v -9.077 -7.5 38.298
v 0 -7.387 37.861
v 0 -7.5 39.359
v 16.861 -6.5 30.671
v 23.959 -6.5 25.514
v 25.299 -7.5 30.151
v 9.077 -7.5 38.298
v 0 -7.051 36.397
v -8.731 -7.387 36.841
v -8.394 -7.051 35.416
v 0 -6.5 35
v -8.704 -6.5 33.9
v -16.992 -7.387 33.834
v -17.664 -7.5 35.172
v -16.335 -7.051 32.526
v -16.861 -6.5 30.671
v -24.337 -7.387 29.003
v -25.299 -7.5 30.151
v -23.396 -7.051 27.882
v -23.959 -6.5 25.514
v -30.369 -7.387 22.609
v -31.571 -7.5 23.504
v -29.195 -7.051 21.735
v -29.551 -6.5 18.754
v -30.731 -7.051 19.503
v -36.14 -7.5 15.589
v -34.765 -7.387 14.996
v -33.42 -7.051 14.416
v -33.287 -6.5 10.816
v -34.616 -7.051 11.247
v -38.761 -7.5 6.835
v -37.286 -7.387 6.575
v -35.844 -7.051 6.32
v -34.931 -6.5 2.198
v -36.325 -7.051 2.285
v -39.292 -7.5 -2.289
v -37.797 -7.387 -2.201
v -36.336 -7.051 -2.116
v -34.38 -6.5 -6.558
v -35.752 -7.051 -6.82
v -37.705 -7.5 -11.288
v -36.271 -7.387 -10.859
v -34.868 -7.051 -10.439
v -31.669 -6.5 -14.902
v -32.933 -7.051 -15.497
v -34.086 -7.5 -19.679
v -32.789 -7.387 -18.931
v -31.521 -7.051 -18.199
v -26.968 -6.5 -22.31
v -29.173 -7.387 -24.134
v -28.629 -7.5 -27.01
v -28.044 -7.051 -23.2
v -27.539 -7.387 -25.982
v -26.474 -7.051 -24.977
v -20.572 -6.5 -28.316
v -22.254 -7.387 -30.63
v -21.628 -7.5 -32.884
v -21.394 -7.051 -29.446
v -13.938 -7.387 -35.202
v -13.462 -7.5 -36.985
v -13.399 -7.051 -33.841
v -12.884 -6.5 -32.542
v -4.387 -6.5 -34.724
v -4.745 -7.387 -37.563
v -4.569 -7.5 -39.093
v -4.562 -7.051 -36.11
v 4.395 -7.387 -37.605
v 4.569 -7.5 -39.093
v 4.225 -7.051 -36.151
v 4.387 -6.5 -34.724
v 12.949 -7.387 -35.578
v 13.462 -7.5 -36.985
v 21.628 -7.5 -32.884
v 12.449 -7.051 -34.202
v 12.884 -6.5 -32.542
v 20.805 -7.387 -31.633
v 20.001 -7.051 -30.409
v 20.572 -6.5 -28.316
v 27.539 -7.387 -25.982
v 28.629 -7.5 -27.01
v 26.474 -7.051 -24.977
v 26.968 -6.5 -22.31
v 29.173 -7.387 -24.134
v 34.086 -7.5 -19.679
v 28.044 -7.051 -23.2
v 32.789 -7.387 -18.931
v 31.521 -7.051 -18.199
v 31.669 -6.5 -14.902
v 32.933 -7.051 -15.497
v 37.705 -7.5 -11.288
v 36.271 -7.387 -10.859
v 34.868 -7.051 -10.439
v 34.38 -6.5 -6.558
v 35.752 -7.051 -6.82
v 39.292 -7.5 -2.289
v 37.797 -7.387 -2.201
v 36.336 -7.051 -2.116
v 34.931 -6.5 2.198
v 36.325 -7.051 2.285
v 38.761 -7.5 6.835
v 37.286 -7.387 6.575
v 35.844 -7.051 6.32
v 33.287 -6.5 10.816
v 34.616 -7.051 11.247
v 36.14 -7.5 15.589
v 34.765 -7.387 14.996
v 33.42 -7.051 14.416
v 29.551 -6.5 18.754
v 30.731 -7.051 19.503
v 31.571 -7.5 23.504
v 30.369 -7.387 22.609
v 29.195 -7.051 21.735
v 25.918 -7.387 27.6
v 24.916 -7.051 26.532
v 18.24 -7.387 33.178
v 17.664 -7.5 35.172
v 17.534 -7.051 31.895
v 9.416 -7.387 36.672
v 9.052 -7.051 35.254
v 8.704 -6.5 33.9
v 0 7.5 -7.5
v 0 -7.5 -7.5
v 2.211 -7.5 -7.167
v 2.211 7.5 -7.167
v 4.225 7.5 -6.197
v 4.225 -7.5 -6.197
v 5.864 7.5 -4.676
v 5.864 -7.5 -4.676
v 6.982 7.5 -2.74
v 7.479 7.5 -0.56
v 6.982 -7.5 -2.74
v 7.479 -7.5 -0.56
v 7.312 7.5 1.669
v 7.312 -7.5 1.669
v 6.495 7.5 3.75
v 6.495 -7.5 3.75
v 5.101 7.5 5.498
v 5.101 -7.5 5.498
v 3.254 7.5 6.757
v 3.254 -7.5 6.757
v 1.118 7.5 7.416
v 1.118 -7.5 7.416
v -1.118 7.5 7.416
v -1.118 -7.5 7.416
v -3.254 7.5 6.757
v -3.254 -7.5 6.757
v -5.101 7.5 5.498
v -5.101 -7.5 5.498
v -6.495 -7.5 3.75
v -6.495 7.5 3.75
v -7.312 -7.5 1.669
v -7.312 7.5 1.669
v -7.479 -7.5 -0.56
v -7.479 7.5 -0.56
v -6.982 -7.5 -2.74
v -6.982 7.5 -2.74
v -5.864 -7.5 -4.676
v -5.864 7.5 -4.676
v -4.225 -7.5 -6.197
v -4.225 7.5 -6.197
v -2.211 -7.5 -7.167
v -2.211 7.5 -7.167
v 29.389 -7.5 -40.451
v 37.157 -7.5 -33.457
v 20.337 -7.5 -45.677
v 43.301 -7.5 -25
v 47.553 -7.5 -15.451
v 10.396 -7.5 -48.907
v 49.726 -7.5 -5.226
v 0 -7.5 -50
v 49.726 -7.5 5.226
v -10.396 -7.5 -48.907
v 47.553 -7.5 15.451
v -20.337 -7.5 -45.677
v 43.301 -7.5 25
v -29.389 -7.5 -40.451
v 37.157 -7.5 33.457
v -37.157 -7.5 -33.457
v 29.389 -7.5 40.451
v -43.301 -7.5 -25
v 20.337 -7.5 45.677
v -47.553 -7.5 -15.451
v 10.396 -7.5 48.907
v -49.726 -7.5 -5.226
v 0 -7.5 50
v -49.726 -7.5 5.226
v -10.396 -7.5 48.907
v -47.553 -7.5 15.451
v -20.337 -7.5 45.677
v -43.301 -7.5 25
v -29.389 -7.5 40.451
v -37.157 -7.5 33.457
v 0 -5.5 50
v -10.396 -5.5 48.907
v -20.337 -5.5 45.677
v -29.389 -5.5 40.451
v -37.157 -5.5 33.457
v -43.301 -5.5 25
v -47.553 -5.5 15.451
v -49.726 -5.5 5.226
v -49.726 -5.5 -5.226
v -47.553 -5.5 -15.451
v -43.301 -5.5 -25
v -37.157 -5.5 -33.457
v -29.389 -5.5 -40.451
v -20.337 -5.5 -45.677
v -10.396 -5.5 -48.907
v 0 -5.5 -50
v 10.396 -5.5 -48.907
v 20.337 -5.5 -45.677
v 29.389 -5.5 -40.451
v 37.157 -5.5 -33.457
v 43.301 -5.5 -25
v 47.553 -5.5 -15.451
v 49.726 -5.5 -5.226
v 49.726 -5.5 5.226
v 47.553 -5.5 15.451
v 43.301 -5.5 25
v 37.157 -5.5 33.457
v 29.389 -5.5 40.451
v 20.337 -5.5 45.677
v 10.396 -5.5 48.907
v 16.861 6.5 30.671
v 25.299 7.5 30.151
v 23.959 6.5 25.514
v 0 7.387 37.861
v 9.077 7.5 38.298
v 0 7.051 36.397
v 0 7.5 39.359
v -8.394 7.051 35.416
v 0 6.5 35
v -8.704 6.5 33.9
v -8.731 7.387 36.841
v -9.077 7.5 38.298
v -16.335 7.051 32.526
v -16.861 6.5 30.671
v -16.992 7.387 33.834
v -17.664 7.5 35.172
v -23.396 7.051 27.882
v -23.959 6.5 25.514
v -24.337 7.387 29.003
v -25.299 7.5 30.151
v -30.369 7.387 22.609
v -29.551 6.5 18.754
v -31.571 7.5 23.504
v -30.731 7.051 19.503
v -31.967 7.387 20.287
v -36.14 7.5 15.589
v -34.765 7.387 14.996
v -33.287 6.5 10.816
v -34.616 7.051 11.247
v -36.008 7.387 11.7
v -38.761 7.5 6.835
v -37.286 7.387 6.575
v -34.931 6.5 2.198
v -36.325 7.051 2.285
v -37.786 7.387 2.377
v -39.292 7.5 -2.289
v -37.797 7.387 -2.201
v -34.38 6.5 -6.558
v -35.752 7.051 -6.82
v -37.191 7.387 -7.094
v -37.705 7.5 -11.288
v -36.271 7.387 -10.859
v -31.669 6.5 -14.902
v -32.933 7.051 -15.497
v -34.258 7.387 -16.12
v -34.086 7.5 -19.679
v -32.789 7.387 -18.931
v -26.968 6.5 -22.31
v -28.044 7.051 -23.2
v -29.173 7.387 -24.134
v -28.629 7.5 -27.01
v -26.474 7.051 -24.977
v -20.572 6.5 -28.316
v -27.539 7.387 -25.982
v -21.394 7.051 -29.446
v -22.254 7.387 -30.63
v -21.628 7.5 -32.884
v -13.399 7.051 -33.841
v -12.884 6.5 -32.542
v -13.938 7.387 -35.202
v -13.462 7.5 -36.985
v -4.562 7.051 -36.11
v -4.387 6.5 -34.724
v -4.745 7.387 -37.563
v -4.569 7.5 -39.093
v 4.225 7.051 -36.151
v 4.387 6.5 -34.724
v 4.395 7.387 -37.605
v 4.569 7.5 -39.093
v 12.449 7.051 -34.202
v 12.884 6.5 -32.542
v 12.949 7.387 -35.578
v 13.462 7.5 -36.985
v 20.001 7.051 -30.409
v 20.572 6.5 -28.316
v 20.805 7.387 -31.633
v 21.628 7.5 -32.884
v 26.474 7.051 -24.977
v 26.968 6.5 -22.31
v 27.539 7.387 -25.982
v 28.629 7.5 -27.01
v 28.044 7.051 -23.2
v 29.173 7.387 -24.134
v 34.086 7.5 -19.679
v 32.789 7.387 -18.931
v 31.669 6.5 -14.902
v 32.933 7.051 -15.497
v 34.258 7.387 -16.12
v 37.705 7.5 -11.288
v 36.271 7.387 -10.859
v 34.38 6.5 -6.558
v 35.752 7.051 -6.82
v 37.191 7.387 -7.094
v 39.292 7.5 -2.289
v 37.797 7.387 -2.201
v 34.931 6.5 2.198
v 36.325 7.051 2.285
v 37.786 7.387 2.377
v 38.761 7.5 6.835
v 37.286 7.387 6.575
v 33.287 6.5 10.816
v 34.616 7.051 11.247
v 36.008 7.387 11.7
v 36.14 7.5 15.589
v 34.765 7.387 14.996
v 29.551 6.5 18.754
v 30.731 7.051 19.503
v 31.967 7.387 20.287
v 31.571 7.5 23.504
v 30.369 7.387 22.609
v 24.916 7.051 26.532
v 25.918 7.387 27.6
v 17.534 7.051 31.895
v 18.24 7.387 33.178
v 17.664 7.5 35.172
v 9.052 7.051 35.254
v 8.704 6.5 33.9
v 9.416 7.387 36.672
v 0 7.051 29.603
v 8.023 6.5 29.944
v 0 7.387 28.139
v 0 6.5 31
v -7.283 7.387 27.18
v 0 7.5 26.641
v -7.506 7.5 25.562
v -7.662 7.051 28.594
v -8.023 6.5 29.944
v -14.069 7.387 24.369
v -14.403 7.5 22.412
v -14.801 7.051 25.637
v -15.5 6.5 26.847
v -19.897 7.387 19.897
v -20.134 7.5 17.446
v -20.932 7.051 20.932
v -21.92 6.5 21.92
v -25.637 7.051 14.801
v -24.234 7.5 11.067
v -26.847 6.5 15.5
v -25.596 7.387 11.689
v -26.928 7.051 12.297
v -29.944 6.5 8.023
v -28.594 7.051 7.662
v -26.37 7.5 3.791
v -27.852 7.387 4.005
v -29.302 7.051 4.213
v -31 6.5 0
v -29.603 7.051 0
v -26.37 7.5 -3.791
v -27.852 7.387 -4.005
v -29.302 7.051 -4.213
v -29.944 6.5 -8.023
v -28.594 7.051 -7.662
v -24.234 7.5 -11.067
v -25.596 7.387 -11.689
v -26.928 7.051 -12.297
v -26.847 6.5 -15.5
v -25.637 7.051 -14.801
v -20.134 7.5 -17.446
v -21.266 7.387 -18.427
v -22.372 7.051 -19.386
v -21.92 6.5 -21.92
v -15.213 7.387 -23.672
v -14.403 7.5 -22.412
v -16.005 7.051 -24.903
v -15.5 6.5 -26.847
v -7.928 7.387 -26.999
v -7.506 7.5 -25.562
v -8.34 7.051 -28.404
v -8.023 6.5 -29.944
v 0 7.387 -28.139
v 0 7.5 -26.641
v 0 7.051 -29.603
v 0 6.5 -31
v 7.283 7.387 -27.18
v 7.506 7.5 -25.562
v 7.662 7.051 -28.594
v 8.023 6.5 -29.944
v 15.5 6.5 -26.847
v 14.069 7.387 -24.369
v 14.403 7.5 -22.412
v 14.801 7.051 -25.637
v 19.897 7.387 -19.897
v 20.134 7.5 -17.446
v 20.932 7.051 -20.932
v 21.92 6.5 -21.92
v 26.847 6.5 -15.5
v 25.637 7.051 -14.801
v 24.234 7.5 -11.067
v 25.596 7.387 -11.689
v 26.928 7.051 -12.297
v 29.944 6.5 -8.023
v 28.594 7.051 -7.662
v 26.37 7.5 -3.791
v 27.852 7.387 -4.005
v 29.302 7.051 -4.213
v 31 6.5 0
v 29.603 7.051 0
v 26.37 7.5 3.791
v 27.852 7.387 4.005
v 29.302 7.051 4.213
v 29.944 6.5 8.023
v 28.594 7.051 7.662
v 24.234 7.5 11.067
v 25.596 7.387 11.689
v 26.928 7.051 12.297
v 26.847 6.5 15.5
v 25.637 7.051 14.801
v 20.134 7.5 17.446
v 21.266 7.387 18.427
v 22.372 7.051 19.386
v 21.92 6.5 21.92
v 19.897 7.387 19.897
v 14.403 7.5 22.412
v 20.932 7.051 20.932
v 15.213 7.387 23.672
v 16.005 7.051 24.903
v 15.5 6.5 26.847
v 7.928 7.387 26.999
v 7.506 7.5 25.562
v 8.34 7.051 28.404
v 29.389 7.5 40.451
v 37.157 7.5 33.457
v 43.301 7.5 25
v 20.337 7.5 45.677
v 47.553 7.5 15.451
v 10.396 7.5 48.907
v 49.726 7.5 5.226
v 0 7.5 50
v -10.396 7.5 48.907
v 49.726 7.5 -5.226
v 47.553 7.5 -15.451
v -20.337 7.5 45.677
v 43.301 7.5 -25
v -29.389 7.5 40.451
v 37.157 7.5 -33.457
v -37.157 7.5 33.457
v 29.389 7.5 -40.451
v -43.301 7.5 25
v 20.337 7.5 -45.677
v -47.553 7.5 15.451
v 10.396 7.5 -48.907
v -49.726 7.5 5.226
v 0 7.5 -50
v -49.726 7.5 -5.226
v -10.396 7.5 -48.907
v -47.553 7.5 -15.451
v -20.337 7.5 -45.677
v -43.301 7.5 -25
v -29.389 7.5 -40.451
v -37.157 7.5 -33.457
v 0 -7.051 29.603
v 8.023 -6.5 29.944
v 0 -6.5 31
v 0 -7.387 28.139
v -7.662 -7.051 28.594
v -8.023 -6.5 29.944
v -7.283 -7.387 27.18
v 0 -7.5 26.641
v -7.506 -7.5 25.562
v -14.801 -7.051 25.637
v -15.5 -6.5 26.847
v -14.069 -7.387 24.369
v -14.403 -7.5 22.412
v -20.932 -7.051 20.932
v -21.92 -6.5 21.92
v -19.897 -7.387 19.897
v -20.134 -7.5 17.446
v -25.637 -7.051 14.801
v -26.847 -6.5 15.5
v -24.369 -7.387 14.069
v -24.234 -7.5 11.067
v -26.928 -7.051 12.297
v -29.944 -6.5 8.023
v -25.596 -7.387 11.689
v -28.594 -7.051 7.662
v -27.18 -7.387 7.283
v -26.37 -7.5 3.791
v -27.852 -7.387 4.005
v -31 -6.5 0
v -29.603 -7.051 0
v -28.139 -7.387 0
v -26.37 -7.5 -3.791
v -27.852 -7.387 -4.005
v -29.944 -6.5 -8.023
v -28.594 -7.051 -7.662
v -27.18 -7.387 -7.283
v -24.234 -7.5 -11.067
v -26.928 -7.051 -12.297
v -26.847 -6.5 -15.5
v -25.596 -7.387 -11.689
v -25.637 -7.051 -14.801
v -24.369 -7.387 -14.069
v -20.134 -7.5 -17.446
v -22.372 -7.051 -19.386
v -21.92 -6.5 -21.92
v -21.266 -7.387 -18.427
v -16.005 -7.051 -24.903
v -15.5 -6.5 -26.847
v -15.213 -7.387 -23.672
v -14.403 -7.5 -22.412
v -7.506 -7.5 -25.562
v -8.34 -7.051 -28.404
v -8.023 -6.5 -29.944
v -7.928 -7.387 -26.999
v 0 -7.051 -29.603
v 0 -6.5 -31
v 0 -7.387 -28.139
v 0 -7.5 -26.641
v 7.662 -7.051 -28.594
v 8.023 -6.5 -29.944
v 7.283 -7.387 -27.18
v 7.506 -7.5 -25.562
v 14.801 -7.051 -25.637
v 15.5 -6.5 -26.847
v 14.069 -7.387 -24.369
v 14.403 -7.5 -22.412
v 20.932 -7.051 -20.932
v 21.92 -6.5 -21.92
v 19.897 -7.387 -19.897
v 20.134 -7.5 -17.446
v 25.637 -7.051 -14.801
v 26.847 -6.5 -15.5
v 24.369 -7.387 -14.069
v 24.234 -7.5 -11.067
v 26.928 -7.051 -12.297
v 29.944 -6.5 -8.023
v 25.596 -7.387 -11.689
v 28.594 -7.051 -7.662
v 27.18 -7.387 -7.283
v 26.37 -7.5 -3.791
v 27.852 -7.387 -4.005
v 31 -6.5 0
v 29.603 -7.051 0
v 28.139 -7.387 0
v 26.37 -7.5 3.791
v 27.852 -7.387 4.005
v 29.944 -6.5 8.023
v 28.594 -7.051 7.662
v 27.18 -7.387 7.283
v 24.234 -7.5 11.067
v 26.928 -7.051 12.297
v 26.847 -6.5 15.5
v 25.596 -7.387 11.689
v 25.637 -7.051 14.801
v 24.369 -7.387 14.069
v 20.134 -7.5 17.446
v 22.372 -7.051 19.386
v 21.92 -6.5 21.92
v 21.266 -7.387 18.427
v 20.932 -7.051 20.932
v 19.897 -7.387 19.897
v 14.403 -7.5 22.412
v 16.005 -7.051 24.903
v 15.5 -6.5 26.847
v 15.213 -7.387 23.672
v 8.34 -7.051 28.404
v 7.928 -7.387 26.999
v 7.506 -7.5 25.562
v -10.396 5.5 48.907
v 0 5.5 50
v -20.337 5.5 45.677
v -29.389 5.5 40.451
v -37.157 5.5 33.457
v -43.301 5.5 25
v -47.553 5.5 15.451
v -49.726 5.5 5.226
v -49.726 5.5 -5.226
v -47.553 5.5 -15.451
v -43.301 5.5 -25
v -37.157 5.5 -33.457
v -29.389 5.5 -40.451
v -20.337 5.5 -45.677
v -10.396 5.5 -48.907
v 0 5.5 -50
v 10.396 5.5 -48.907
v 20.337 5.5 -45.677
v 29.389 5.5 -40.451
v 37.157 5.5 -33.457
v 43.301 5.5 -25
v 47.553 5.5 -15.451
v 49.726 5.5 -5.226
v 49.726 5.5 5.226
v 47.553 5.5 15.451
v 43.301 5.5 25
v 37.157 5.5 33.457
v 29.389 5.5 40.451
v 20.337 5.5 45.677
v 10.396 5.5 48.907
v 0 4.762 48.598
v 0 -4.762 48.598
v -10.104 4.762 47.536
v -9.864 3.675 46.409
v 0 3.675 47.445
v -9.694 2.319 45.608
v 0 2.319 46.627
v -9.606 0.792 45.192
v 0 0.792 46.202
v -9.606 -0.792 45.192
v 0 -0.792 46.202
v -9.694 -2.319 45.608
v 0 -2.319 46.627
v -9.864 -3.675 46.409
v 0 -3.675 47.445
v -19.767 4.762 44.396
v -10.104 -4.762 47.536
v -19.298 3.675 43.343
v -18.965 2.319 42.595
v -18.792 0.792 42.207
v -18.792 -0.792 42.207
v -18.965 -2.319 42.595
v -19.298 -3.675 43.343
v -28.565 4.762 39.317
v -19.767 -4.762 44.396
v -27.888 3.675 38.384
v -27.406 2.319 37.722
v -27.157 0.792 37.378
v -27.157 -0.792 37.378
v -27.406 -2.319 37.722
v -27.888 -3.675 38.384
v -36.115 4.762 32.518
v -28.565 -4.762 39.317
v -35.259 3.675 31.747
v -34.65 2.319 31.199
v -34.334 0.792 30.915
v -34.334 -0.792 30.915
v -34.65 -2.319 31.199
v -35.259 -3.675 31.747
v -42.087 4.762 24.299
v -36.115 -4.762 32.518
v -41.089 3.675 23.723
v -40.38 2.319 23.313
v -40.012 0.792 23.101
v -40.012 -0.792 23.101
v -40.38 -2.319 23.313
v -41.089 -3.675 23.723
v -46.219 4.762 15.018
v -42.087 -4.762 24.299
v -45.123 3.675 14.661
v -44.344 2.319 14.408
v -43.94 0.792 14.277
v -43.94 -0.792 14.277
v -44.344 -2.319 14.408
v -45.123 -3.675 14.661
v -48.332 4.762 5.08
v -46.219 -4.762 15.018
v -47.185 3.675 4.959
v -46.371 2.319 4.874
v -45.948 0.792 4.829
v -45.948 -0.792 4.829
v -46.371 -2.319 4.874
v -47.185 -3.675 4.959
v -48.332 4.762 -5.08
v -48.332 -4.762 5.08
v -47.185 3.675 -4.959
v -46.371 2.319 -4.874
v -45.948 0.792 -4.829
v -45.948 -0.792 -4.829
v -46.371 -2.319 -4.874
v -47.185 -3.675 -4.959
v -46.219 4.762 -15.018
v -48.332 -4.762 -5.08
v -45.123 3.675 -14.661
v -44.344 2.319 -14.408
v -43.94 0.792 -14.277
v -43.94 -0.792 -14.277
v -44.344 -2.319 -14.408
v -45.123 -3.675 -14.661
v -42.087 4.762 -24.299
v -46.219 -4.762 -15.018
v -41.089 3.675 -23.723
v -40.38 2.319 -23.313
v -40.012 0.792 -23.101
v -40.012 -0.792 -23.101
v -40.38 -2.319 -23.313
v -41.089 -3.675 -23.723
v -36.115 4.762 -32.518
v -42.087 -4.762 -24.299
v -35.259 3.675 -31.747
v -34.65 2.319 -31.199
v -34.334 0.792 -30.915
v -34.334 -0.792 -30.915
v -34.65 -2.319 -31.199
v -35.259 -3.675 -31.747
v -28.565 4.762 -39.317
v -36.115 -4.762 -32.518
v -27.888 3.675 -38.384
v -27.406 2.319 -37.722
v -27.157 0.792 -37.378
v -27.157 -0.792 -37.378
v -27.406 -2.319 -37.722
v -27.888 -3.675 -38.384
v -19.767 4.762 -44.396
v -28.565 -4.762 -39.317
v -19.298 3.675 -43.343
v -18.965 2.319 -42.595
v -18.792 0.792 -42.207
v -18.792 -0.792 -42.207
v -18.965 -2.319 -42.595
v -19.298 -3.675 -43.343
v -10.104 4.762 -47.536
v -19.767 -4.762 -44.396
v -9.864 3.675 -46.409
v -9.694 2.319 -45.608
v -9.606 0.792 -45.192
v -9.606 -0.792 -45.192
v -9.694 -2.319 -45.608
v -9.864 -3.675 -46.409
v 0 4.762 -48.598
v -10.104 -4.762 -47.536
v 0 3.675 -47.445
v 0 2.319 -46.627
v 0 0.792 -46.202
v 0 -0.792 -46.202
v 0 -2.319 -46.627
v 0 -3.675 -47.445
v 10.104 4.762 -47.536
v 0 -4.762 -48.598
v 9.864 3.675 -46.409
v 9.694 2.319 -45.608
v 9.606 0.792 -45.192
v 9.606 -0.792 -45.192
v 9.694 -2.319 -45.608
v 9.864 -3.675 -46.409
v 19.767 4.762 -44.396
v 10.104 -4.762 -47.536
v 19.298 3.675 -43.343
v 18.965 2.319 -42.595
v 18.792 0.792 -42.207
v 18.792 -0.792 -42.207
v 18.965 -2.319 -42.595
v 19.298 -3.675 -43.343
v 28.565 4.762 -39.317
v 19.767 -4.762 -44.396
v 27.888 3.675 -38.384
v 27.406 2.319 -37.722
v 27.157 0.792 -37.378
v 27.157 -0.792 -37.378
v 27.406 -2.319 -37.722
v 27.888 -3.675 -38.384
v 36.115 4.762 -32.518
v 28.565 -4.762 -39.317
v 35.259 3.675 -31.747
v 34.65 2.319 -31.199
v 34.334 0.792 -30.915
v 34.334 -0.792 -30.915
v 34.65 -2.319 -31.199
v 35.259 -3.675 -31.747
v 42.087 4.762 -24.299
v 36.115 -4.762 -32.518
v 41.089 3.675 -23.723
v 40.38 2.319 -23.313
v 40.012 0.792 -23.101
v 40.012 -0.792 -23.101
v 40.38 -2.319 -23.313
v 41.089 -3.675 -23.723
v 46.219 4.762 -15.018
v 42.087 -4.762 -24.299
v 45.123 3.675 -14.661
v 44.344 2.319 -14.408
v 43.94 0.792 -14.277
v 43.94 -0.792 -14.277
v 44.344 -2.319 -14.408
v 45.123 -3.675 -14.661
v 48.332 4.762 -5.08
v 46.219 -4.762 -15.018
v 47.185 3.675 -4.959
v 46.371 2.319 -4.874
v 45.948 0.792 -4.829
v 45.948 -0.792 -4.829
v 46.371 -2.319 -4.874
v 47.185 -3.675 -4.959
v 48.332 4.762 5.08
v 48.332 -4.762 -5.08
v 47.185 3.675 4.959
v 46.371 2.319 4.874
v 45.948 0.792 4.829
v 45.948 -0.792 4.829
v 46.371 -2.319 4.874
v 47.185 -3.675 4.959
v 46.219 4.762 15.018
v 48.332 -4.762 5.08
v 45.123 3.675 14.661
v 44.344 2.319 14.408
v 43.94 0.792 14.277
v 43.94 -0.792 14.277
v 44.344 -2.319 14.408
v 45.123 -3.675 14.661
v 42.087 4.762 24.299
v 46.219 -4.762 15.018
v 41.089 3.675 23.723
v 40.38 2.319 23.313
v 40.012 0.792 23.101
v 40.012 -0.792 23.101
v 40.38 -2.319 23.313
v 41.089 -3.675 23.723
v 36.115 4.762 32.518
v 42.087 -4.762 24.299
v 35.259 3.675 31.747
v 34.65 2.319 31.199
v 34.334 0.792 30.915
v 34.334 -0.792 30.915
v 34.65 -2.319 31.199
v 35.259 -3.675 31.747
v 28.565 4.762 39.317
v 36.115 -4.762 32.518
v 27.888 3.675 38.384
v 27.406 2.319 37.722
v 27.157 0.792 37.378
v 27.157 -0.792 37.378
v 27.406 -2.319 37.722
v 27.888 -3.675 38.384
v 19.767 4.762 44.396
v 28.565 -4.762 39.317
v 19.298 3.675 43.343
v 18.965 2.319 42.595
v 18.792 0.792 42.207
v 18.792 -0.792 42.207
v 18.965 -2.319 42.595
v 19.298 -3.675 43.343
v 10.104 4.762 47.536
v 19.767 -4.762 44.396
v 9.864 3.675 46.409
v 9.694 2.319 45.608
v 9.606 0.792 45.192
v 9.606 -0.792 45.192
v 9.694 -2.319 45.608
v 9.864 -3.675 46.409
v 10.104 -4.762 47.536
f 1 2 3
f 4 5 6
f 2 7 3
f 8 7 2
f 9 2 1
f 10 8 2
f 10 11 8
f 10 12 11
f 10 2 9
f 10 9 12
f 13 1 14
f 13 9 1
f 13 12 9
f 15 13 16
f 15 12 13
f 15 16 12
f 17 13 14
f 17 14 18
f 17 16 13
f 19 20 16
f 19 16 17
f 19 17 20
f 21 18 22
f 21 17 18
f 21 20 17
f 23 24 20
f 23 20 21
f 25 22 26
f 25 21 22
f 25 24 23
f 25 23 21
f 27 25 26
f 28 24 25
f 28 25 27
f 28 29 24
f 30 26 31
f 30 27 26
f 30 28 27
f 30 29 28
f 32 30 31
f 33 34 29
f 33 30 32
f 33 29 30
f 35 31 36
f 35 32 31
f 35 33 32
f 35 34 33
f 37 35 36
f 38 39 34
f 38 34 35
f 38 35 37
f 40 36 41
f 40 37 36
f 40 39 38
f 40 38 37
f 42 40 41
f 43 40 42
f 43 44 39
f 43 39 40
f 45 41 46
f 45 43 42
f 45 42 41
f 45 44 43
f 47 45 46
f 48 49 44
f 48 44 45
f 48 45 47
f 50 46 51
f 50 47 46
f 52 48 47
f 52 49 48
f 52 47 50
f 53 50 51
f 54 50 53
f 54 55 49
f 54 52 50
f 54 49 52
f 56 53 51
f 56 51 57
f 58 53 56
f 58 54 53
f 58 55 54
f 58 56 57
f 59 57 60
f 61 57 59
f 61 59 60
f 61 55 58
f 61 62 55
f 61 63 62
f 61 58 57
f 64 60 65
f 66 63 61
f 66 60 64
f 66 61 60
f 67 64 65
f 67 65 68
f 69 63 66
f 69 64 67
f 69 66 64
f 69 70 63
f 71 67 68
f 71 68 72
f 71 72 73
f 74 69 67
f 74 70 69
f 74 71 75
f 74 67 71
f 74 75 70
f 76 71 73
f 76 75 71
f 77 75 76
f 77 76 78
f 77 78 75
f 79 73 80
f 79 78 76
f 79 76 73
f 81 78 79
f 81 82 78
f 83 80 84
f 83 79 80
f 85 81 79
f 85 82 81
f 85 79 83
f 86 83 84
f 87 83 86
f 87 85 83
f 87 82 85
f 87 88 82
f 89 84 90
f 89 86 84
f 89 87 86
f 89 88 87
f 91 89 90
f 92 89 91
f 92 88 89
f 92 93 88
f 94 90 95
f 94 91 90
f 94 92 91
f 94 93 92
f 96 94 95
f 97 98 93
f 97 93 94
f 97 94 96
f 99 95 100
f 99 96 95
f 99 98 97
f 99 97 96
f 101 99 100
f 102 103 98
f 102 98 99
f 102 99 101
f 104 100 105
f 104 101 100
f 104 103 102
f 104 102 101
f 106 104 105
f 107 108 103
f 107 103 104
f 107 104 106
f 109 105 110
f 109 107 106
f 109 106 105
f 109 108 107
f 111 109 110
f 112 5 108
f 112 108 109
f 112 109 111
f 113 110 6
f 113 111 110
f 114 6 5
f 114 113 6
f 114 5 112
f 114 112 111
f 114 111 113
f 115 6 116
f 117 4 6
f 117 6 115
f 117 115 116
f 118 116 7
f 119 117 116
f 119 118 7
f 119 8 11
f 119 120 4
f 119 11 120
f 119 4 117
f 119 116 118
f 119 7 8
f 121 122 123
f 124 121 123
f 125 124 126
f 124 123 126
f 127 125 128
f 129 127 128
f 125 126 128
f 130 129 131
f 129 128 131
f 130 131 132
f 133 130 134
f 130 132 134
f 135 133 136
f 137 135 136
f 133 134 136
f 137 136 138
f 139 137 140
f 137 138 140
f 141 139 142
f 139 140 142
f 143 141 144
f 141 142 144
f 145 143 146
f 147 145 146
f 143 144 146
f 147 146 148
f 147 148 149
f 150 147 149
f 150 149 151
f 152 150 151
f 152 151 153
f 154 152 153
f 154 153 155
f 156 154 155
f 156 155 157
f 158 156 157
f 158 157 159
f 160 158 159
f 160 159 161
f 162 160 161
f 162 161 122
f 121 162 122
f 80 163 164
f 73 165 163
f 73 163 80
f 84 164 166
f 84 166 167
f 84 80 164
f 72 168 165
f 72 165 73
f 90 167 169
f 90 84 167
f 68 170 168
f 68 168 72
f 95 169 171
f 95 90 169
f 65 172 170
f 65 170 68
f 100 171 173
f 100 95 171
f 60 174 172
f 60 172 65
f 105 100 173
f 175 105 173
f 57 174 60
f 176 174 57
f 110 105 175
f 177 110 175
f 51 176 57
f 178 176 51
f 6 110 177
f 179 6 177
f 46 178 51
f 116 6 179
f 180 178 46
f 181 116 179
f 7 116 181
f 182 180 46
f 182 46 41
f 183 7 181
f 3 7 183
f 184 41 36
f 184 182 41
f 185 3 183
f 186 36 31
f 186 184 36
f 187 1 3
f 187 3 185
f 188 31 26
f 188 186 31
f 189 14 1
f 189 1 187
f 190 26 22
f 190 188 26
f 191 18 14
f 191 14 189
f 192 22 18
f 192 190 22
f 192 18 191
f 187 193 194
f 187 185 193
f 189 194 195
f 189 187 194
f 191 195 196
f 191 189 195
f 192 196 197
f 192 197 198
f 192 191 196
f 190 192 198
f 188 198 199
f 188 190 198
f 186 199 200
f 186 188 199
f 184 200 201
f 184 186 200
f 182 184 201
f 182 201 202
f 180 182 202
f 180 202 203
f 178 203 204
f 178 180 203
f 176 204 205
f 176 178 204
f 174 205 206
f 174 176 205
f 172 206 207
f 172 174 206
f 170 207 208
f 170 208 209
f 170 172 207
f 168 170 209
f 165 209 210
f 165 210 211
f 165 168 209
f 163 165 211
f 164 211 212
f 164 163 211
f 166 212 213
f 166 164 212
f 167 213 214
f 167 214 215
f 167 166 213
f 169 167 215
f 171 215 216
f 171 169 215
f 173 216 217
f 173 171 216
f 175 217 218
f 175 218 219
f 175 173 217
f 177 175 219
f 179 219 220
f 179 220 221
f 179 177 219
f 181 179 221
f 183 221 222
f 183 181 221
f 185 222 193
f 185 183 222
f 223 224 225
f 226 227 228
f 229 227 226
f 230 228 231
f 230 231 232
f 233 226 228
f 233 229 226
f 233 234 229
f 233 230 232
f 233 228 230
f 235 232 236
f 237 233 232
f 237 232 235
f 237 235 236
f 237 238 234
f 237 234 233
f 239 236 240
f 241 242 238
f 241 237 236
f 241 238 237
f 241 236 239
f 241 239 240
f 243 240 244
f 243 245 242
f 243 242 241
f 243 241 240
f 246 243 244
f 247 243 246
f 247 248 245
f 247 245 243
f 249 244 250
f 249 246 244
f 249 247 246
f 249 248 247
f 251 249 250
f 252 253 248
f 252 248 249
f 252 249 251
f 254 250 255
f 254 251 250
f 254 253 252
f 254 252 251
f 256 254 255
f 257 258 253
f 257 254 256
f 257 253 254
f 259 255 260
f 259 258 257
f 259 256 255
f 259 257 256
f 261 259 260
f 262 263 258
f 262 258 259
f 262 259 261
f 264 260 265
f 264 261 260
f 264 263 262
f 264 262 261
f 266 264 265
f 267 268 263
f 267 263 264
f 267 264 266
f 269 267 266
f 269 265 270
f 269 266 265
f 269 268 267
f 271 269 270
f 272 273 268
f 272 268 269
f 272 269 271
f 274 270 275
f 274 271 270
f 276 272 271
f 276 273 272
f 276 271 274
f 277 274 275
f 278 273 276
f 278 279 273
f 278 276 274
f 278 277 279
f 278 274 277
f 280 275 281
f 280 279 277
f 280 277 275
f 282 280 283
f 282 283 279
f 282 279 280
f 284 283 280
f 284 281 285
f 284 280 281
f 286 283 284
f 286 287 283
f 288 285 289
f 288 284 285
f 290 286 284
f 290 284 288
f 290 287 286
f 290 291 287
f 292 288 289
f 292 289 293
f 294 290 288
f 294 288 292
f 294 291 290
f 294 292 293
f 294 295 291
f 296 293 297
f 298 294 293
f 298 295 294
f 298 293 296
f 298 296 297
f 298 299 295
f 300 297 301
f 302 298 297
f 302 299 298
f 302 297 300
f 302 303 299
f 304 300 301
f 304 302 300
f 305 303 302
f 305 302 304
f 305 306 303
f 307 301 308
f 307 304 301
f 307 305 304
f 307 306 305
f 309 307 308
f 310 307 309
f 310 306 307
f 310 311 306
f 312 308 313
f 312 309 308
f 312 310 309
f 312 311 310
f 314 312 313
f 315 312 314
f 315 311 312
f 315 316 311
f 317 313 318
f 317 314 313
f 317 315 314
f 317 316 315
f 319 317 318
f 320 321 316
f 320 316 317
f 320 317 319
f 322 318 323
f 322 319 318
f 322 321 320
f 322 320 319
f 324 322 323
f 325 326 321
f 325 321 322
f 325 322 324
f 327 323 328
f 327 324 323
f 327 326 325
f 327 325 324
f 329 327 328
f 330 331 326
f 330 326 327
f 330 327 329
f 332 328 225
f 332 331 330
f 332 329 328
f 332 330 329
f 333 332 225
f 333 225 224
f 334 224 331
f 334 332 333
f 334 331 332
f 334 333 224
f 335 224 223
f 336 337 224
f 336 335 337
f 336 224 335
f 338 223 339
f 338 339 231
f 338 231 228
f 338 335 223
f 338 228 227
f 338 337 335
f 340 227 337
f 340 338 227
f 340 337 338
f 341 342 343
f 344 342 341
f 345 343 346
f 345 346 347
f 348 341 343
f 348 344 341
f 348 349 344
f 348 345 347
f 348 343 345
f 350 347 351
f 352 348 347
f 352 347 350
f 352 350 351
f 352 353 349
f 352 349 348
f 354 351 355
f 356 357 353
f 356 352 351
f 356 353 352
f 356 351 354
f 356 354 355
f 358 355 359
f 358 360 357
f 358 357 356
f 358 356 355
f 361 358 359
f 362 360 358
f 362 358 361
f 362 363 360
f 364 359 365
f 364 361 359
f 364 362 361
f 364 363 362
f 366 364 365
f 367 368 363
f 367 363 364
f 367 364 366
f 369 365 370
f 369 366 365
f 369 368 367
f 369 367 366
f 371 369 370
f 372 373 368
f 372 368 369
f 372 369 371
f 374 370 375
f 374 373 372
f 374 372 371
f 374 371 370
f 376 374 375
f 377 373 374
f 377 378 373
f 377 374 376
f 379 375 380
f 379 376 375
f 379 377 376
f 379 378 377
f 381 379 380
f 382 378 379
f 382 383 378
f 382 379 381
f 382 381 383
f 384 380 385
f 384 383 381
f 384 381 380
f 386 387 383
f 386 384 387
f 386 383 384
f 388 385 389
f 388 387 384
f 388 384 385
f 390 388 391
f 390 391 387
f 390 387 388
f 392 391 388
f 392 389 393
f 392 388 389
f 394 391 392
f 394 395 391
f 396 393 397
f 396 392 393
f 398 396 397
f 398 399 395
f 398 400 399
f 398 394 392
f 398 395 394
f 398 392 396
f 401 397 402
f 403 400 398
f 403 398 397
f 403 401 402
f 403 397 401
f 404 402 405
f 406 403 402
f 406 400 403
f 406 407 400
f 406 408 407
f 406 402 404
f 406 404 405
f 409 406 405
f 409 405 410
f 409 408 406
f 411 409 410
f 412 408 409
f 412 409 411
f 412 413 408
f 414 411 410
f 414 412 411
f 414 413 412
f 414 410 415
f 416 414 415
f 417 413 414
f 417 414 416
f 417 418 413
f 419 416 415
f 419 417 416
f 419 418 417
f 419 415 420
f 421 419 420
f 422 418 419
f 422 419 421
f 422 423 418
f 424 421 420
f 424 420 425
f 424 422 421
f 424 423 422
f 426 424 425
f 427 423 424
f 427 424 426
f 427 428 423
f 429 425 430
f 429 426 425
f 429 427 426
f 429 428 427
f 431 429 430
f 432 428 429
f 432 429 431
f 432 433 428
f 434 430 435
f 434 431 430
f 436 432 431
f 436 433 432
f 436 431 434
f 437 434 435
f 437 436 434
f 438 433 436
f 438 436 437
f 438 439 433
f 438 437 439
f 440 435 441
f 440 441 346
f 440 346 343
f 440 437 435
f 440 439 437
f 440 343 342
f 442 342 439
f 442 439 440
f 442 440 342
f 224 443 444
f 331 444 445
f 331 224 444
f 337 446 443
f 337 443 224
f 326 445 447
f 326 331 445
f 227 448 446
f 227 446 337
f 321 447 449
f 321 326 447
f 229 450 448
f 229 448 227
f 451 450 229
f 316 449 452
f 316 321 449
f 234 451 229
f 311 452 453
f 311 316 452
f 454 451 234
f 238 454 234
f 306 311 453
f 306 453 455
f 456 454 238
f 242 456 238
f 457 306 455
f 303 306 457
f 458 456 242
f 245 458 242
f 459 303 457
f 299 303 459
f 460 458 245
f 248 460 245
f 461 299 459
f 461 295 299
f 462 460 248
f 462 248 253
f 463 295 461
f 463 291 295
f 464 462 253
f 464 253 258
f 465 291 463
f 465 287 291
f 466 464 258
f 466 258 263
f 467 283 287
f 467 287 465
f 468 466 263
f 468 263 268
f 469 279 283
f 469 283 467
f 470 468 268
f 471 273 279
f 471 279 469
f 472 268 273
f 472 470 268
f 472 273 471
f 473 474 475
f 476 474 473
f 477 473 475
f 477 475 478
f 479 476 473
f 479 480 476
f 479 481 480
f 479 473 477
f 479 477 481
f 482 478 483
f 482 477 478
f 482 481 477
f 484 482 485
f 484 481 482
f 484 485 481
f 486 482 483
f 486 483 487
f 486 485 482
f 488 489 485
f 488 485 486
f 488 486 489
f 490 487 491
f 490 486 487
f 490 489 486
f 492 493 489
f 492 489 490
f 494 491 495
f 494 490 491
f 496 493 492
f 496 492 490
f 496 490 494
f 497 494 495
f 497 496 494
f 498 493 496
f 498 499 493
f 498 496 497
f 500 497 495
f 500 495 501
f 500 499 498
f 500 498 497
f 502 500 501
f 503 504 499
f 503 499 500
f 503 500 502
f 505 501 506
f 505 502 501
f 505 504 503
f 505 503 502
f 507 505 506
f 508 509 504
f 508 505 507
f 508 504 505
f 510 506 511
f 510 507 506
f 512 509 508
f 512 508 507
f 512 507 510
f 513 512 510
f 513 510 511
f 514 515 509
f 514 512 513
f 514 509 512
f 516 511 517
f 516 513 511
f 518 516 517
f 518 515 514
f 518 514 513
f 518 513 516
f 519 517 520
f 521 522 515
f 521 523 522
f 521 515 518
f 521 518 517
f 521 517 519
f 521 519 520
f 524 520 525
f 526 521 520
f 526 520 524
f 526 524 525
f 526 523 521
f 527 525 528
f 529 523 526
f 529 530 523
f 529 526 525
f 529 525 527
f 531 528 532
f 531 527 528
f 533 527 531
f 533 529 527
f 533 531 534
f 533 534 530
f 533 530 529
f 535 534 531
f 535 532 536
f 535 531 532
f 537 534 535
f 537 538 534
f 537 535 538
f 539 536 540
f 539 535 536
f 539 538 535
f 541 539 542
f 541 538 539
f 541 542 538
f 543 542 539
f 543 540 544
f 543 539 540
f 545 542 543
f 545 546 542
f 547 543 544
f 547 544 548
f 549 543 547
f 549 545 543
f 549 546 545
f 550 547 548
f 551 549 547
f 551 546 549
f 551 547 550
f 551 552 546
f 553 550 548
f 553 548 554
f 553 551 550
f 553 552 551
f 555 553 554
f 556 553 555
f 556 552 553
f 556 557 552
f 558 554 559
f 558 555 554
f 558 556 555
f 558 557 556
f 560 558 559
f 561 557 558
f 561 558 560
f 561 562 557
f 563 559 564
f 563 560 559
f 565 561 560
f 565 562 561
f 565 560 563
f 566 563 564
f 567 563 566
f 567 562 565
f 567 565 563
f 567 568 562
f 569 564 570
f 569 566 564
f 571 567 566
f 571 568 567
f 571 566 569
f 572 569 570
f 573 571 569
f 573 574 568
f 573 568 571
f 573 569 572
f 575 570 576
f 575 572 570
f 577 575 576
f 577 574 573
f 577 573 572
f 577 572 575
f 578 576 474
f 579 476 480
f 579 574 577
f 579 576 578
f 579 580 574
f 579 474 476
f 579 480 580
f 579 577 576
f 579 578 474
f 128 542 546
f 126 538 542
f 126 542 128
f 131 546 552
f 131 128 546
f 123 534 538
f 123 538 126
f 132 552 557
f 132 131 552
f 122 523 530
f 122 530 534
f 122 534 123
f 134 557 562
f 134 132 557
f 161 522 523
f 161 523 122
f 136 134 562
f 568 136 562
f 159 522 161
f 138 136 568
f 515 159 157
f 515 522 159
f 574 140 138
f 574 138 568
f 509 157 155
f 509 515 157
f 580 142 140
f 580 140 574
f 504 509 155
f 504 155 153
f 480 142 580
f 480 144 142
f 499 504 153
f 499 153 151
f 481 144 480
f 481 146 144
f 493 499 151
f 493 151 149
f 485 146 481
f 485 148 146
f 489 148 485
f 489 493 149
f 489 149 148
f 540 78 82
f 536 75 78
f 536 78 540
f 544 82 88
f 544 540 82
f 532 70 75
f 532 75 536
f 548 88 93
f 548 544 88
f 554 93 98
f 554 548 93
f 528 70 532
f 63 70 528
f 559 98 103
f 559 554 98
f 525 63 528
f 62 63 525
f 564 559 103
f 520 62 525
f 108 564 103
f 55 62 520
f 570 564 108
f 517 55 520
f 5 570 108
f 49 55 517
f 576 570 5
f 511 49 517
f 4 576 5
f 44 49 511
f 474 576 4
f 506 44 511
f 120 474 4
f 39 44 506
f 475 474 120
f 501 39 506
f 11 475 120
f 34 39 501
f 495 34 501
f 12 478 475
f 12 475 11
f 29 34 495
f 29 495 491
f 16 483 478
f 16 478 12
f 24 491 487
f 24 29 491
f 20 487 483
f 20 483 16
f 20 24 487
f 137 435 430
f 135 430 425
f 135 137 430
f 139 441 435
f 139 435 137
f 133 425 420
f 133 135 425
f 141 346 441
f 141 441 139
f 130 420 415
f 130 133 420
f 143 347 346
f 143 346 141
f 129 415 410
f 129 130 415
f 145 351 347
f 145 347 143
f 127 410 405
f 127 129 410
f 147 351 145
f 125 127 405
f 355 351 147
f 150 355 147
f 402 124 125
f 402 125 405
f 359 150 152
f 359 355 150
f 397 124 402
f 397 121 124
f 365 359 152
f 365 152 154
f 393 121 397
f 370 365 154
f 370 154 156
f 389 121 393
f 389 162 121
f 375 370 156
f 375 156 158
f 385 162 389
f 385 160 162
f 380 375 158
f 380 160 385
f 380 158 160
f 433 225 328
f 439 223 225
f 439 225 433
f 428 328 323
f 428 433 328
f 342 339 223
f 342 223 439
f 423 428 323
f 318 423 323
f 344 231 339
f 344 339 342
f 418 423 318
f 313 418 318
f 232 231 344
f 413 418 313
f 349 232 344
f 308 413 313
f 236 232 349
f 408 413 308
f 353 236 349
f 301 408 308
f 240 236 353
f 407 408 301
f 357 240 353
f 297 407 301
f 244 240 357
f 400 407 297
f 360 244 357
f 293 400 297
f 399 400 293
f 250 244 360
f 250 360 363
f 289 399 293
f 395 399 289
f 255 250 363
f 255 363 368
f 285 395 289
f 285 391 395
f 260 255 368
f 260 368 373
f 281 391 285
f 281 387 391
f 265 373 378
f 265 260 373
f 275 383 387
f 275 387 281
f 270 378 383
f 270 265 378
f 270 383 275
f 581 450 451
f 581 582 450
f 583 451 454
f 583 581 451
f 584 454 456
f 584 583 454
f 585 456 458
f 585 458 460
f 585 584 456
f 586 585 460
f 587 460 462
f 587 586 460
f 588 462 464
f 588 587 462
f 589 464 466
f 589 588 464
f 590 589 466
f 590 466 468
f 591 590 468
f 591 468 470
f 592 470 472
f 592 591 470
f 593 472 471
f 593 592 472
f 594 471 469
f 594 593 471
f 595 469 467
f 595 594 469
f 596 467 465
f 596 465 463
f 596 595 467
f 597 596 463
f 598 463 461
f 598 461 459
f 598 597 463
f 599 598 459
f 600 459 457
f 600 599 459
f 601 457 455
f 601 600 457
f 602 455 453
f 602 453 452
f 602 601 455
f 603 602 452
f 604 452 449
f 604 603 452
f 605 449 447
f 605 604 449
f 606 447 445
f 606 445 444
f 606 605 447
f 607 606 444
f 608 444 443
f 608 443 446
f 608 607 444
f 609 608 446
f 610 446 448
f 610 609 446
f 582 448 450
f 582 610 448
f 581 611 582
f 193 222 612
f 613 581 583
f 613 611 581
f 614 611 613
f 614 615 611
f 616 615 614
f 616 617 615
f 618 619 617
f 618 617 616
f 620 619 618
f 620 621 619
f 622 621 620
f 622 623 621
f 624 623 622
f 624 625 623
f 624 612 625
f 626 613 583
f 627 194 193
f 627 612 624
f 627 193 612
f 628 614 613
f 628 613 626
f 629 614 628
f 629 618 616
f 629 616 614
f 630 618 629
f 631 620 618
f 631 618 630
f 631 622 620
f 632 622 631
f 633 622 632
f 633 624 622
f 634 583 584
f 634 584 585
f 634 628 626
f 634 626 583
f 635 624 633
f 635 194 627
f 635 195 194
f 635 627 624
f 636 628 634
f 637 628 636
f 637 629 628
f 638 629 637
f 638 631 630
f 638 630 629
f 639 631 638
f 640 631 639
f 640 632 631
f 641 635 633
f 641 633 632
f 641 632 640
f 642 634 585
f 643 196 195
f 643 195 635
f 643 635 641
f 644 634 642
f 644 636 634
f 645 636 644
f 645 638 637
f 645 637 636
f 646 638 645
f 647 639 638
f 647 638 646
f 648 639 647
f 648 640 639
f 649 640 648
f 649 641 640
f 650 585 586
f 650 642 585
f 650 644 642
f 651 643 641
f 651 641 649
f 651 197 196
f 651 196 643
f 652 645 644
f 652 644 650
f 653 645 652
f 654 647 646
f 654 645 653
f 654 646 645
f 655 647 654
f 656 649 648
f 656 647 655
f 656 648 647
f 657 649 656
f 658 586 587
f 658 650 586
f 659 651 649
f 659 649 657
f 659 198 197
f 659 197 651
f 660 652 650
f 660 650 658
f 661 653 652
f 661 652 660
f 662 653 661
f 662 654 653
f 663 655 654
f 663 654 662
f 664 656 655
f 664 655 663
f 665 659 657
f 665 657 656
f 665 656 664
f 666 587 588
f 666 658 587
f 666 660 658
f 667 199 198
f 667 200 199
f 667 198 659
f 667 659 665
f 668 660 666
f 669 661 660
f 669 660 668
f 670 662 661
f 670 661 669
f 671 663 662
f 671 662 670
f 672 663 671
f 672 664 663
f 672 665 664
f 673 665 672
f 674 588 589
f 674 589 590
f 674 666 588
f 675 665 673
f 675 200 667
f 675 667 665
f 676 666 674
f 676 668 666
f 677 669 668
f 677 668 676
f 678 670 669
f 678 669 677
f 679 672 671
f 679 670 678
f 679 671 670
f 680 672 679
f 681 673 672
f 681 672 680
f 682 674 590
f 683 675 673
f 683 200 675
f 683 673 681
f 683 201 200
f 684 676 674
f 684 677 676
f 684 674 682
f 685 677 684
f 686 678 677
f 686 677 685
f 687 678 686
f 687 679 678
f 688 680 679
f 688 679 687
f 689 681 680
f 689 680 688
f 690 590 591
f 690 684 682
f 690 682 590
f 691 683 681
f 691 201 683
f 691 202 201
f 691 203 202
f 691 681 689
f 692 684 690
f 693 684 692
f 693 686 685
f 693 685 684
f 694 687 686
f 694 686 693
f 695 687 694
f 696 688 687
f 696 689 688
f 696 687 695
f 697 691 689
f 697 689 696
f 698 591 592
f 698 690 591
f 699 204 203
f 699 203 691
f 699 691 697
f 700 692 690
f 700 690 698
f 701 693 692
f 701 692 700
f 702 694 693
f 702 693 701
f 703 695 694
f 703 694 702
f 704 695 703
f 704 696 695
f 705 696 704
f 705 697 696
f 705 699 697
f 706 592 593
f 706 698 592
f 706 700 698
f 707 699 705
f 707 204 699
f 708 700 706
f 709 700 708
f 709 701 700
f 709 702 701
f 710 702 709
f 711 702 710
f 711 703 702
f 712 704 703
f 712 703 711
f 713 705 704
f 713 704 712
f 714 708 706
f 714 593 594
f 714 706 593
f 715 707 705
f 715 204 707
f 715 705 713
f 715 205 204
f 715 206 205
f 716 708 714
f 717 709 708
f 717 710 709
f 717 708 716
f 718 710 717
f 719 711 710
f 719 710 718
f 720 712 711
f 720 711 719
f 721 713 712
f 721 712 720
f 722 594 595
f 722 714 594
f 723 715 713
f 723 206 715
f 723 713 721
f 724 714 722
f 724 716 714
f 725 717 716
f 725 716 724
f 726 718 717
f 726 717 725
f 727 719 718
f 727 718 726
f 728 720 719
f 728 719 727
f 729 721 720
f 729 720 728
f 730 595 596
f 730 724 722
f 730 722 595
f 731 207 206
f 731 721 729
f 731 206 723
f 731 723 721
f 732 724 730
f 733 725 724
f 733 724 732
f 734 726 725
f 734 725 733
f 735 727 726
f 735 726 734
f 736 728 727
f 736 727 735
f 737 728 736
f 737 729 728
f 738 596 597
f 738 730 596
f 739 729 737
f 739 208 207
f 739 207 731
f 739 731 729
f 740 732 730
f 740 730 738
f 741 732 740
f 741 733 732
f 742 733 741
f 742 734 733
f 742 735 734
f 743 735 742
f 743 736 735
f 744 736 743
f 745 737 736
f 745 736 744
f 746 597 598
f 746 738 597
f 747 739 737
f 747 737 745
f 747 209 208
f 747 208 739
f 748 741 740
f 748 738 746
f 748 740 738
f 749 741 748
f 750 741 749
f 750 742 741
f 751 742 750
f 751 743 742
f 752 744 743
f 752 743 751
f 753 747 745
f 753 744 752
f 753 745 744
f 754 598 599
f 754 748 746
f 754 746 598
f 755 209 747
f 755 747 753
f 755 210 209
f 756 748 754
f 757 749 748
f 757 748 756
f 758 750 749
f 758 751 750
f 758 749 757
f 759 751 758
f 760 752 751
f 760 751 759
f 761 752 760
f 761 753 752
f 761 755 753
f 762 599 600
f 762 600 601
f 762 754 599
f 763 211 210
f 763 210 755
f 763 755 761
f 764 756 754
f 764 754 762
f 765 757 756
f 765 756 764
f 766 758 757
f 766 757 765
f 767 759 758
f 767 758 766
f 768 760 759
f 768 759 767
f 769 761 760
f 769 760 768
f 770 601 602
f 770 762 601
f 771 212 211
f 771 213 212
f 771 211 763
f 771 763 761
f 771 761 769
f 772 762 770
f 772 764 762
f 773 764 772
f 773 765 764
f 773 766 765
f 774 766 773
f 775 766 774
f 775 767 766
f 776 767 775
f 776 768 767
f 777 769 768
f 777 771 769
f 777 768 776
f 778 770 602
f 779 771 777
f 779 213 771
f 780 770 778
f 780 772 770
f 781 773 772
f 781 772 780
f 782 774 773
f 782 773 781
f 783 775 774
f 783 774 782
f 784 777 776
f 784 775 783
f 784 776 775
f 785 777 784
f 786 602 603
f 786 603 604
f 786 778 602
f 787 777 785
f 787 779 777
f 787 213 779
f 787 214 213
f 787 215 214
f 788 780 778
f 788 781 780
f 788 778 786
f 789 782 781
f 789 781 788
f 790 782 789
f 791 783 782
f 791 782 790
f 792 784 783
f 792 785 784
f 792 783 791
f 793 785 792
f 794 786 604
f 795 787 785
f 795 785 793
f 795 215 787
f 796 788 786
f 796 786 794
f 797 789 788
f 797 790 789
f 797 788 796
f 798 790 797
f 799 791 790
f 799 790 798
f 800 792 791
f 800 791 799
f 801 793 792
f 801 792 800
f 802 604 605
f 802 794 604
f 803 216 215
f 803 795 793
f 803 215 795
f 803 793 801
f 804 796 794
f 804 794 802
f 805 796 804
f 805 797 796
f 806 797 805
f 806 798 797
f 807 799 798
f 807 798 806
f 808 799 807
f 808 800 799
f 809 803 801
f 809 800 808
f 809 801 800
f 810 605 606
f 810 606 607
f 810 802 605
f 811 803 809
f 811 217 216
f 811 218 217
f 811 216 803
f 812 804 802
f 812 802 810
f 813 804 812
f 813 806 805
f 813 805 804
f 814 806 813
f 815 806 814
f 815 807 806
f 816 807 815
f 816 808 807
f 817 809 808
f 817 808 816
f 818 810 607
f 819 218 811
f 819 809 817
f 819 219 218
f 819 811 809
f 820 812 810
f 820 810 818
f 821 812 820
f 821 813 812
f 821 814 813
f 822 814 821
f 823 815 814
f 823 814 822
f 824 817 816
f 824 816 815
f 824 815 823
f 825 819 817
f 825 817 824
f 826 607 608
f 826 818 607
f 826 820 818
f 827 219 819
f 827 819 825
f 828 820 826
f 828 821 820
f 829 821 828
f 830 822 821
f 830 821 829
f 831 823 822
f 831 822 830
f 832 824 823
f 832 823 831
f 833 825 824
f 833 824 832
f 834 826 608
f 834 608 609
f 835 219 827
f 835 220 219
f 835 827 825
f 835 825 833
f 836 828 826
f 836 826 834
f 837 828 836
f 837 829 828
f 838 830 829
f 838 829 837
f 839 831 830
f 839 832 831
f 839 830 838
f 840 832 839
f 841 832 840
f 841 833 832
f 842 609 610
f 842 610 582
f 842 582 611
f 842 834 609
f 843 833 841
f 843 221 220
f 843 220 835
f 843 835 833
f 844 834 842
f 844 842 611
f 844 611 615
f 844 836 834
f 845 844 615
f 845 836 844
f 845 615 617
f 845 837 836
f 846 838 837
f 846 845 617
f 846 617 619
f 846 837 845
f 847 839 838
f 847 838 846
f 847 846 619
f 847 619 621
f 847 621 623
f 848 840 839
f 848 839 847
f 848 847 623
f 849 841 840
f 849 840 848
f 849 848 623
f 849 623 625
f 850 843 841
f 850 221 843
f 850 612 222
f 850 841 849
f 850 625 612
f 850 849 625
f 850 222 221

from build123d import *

# Parameters (mm, degrees)
FILLET1_R          = 10
FILLET2_R          = 10
FILLET3_R          = 10
FILLET4_R          = 10
SKETCH3_R          = 7.5
CUT_EXTRUDE1_DEPTH = 73.284161495


with BuildPart() as part:
    # Sketch2 → Revolve1 (revolve)
    with BuildSketch(Plane(origin=(0, 0, 0), x_dir=(0, 0, -1), z_dir=(1, 0, 0))):
        with BuildLine():
            Line((0, 7.5), (-31, 7.5))
            Line((-31, 7.5), (-31, 6.5))
            Line((-31, 6.5), (-35, 6.5))
            Line((-35, 6.5), (-35, 7.5))
            Line((-35, 7.5), (-50, 7.5))
            Line((-50, 7.5), (-50, 5.5))
            ThreePointArc((-50, 5.5), (-46.147650045, 0), (-50, -5.5))
            Line((-50, -5.5), (-50, -7.5))
            Line((-50, -7.5), (-35, -7.5))
            Line((-35, -7.5), (-35, -6.5))
            Line((-35, -6.5), (-31, -6.5))
            Line((-31, -6.5), (-31, -7.5))
            Line((-31, -7.5), (0, -7.5))
            Line((0, -7.5), (0, 7.5))
        make_face()
    revolve(axis=Axis((0, 55.434917487, 0), (0, -1, 0)))

    # Fillet1
    # the kernel refuses this fillet: 10 mm, written as the material it takes off along each edge
    with BuildSketch(Plane(origin=(0, 7.5, 0), x_dir=(0, 0, 1), z_dir=(1, 0, 0))) as fillet1_piece_1:
        with BuildLine():
            CenterArc((39.358898944, 10), FILLET1_R, 244.158067237, 25.841932763)
            Line((39.358898944, 0), (39.358898944, -0.2))
            Line((39.358898944, -0.2), (35, -0.2))
            Line((35, -0.2), (34.8, 0))
            ThreePointArc((34.8, 0), (34.8, 0.5), (34.912822021, 0.82))
            Line((34.912822021, 0.82), (35, 1))
        make_face()
    revolve(axis=Axis((0, 7.5, 0), (0, -1, 0)), mode=Mode.SUBTRACT)

    # Fillet2
    # the kernel refuses this fillet: 10 mm, written as the material it takes off along each edge
    with BuildSketch(Plane(origin=(0, 7.5, 0), x_dir=(0, 0, 1), z_dir=(1, 0, 0))) as fillet2_piece_1:
        with BuildLine():
            CenterArc((26.641101056, 10), FILLET2_R, 270, 25.841932763)
            Line((26.641101056, 0), (26.641101056, -0.2))
            Line((26.641101056, -0.2), (31, -0.2))
            Line((31, -0.2), (31.2, 0))
            ThreePointArc((31.2, 0), (31.2, 0.5), (31.087177979, 0.82))
            Line((31.087177979, 0.82), (31, 1))
        make_face()
    revolve(axis=Axis((0, 7.5, 0), (0, -1, 0)), mode=Mode.SUBTRACT)

    # Fillet3
    # the kernel refuses this fillet: 10 mm, written as the material it takes off along each edge
    with BuildSketch(Plane(origin=(0, -7.5, 0), x_dir=(0, 0, 1), z_dir=(1, 0, 0))) as fillet3_piece_1:
        with BuildLine():
            CenterArc((39.358898944, -10), FILLET3_R, 90, 25.841932763)
            Line((35, -1), (34.912822021, -0.82))
            ThreePointArc((34.912822021, -0.82), (34.8, -0.5), (34.8, 0))
            Line((34.8, 0), (35, 0.2))
            Line((35, 0.2), (39.358898944, 0.2))
            Line((39.358898944, 0.2), (39.358898944, 0))
        make_face()
    revolve(axis=Axis((0, -7.5, 0), (0, -1, 0)), mode=Mode.SUBTRACT)

    # Fillet4
    # the kernel refuses this fillet: 10 mm, written as the material it takes off along each edge
    with BuildSketch(Plane(origin=(0, -7.5, 0), x_dir=(0, 0, 1), z_dir=(1, 0, 0))) as fillet4_piece_1:
        with BuildLine():
            CenterArc((26.641101056, -10), FILLET4_R, 64.158067237, 25.841932763)
            Line((26.641101056, 0), (26.641101056, 0.2))
            Line((26.641101056, 0.2), (31, 0.2))
            Line((31, 0.2), (31.2, 0))
            ThreePointArc((31.2, 0), (31.2, -0.5), (31.087177979, -0.82))
            Line((31.087177979, -0.82), (31, -1))
        make_face()
    revolve(axis=Axis((0, -7.5, 0), (0, -1, 0)), mode=Mode.SUBTRACT)

    # Sketch3 → Cut-Extrude1 (cut, through all)
    with BuildSketch(Plane.XZ.offset(7.5)):
        with Locations(Location((0, 0, 0), (0, 0, 270))):
            Circle(SKETCH3_R)
    extrude(amount=-CUT_EXTRUDE1_DEPTH, mode=Mode.SUBTRACT)


solid = part.part
